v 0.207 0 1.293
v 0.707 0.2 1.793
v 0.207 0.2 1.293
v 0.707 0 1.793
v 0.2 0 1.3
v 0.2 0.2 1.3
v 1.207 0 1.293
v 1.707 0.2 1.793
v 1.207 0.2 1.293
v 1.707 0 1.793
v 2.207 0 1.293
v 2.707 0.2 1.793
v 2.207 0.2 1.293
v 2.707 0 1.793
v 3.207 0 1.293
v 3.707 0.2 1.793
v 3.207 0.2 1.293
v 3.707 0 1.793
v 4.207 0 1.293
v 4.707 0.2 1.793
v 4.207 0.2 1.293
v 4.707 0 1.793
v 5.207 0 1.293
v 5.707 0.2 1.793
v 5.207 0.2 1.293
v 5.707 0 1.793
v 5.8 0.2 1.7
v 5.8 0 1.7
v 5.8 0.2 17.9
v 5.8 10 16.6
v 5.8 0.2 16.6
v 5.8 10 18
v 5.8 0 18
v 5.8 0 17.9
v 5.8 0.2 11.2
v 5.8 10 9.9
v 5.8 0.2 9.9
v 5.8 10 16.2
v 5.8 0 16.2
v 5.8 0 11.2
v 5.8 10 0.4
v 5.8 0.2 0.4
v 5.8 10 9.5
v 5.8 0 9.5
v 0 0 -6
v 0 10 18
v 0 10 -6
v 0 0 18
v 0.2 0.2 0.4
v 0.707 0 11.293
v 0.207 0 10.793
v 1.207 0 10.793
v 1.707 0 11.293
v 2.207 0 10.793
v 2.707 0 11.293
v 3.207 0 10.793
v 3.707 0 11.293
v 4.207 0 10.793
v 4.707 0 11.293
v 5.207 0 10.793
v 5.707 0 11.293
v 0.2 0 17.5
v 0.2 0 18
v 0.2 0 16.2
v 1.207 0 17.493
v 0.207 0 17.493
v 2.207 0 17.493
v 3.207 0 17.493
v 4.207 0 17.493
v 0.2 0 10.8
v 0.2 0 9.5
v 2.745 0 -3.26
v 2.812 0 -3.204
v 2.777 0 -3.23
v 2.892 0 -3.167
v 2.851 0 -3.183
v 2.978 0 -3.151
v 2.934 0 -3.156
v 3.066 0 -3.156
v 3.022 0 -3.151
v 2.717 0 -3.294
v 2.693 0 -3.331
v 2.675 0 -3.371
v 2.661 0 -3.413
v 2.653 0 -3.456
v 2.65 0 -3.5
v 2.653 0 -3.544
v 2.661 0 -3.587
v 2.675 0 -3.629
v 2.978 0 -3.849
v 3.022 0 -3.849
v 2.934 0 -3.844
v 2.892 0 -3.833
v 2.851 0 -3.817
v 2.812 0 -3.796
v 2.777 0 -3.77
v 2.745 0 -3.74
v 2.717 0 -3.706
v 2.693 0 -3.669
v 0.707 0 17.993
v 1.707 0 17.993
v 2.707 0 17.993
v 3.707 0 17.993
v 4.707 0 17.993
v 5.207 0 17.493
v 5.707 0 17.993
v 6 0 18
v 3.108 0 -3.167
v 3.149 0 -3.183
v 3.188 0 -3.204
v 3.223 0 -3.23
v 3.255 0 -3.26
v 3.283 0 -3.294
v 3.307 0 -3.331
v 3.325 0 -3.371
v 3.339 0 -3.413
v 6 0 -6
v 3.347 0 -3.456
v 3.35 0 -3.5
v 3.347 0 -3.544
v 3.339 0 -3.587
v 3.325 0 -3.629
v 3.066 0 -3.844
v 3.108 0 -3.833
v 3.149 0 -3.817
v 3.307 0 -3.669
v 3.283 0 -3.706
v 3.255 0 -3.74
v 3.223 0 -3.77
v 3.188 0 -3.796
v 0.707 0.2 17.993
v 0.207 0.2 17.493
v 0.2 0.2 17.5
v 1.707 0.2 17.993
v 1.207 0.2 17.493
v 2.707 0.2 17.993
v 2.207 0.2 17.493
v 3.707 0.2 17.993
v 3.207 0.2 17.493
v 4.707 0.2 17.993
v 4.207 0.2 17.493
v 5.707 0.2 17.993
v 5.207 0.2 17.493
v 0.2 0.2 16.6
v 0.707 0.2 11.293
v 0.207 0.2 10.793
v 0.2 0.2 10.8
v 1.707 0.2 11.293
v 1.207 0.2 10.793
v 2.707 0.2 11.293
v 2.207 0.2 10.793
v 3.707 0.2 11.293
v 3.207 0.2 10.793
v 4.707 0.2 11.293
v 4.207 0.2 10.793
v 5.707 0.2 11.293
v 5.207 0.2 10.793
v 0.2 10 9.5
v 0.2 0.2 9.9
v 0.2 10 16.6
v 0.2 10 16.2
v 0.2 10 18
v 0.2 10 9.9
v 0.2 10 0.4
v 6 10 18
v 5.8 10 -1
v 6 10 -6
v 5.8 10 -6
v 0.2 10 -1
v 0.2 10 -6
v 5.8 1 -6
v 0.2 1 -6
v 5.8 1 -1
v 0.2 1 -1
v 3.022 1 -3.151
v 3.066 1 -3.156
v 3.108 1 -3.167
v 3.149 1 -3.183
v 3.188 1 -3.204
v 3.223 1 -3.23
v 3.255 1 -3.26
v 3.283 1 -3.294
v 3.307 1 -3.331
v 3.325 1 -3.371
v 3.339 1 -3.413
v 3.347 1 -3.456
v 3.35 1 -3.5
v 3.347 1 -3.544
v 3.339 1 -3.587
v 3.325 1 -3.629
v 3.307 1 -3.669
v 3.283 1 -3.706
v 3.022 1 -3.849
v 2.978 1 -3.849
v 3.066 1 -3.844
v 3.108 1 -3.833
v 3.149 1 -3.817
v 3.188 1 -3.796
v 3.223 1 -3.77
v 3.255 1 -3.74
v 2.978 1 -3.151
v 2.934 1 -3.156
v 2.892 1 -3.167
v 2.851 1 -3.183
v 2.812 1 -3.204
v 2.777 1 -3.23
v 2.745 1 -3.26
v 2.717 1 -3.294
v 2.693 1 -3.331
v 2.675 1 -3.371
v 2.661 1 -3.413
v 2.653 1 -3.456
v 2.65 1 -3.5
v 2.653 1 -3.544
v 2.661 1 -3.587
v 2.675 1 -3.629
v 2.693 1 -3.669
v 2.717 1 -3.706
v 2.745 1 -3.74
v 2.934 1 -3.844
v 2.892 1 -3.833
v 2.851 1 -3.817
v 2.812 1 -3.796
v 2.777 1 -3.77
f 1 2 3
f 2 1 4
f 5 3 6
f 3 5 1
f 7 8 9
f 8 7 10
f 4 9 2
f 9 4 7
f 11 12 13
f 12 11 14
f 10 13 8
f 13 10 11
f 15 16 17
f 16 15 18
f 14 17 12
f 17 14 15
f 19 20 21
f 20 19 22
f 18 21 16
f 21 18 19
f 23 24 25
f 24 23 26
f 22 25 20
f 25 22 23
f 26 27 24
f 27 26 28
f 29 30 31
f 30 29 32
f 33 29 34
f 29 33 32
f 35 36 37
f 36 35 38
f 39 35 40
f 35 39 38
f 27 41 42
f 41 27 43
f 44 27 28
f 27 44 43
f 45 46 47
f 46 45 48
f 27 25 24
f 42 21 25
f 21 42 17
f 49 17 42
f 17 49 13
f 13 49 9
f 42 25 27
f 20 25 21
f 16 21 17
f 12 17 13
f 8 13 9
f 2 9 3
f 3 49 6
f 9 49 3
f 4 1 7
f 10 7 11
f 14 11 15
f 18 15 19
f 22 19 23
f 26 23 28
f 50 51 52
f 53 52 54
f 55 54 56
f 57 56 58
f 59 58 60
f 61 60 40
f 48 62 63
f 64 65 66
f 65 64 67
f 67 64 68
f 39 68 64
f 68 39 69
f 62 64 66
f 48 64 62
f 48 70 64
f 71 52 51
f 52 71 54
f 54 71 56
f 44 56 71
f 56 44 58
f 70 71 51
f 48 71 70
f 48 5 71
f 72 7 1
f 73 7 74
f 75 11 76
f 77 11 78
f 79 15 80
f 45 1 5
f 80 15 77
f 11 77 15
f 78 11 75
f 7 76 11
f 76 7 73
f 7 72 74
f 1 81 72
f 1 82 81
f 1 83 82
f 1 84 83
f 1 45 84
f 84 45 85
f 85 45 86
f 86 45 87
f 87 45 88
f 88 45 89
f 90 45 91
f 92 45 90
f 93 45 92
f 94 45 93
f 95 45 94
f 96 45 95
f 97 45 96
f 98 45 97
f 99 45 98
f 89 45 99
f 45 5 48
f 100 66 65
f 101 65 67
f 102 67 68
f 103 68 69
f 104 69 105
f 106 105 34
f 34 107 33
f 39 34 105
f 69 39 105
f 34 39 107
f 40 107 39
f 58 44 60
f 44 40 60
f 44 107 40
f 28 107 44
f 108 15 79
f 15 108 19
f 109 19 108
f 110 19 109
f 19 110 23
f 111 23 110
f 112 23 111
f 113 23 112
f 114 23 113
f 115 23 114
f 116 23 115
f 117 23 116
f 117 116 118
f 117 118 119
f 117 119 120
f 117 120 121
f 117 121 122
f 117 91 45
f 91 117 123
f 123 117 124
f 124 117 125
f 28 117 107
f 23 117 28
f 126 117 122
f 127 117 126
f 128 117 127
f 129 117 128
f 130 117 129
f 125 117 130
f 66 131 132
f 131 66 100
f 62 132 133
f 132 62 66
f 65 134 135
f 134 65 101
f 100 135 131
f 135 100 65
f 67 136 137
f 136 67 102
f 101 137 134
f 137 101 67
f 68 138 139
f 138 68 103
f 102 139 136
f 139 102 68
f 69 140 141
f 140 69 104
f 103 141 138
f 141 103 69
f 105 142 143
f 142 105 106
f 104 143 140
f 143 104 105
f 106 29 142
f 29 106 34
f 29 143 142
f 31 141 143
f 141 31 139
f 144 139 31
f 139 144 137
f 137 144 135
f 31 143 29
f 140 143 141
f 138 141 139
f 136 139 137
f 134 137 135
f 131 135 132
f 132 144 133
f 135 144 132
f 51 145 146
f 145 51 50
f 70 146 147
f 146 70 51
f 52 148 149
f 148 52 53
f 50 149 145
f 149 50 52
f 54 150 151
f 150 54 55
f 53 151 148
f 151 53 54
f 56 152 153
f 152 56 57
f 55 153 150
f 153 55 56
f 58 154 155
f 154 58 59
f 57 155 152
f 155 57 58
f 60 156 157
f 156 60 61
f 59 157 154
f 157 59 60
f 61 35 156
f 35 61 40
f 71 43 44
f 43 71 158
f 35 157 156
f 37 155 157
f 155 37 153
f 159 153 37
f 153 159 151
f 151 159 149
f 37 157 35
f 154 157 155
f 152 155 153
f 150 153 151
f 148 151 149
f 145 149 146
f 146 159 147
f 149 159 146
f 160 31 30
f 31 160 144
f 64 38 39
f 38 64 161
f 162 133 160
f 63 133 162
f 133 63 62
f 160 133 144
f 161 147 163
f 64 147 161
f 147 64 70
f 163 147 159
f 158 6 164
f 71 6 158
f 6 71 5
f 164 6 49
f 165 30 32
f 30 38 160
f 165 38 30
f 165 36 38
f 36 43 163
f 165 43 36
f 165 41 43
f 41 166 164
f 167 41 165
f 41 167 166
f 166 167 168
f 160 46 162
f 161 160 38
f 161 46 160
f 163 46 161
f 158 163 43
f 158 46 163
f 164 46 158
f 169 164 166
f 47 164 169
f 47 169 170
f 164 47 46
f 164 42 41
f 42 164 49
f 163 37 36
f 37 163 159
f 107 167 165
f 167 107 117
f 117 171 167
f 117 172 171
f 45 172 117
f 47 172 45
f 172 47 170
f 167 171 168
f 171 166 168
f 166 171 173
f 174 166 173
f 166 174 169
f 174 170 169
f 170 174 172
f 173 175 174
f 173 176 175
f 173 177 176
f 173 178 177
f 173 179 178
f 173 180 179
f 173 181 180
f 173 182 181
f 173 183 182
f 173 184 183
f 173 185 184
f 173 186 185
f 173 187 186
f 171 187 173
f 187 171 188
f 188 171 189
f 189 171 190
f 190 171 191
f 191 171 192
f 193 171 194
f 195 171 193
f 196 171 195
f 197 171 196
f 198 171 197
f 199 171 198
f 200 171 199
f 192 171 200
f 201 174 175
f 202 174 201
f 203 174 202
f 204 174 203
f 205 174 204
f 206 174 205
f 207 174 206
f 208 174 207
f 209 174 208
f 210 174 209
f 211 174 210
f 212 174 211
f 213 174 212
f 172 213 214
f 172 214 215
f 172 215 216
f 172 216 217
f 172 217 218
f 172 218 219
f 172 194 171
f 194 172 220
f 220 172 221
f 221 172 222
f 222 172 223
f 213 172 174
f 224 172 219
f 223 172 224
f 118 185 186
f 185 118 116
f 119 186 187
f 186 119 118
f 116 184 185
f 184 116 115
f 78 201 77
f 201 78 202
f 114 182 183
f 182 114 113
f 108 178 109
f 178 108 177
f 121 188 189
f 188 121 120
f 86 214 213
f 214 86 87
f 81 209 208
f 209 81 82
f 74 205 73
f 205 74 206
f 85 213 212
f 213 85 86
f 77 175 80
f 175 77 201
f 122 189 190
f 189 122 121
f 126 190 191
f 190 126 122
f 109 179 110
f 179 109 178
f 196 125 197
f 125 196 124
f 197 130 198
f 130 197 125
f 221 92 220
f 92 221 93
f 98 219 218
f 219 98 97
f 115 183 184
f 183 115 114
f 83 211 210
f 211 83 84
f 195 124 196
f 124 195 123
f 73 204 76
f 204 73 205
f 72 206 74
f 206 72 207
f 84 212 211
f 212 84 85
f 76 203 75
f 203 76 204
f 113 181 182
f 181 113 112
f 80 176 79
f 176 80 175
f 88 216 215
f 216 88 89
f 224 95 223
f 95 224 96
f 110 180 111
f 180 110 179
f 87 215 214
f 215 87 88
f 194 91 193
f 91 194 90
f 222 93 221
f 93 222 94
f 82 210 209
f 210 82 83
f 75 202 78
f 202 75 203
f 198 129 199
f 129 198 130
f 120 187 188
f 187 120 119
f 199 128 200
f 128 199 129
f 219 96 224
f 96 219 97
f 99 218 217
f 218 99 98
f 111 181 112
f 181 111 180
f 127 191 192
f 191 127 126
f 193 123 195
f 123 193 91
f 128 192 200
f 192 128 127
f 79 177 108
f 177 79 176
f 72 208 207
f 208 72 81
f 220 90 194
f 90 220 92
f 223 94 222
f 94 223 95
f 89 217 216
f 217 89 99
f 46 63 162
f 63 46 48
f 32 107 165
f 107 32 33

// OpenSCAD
$fn=50;
h_top = 8.5;
h_bottom = 9.5;
n_blocks = 13;
depth = 10;
//                Top of of the cathedral
// <----------------------------------------------------


floor_thickness = 4;
cathedral_width = 5.6;

//                Height of the Red Book

wall_thickness = 0.2;
module floor_decor() {
  difference() {
    cube([wall_thickness + cathedral_width, 0.2, 2.0]);
    for(i=[0:6]) { translate([-0.5 + i,-0.2,2.0]) rotate([0,45,0]) cube([1,1,1]);}
  }
}
module floors() {
  translate([wall_thickness,0, h_bottom+h_top-1.8]) cube([cathedral_width,depth,.4]);
  translate([0,0,h_bottom+h_top-1.8]) floor_decor();
  cube([wall_thickness + cathedral_width,depth,.4]);
  translate([wall_thickness,0, h_bottom]) cube([cathedral_width,depth,.4]);
  translate([0,0,h_bottom]) floor_decor();
  cube([wall_thickness + cathedral_width,depth,.4]);
  floor_decor();
}

floors();

// <---------------------------------------------------




cm_per_block = h_bottom/n_blocks;
cube([wall_thickness, 10, h_bottom+h_top]);
translate([cathedral_width + wall_thickness ,0,0])
  cube([wall_thickness, 10, h_bottom+h_top]);
// ==========

//
//     Motor Housing
//

housing_height = 6;
hole_height = 2.5;
difference() {
translate([0,0, -housing_height]) cube([cathedral_width + wall_thickness * 2 ,depth, housing_height]);
translate([wall_thickness,1, -housing_height-1]) cube([cathedral_width,depth, housing_height]);
translate([wall_thickness + cathedral_width/2, 0, -housing_height + hole_height]) rotate([90,0,0]) cylinder(h=20, d=0.7, center=true);
}
